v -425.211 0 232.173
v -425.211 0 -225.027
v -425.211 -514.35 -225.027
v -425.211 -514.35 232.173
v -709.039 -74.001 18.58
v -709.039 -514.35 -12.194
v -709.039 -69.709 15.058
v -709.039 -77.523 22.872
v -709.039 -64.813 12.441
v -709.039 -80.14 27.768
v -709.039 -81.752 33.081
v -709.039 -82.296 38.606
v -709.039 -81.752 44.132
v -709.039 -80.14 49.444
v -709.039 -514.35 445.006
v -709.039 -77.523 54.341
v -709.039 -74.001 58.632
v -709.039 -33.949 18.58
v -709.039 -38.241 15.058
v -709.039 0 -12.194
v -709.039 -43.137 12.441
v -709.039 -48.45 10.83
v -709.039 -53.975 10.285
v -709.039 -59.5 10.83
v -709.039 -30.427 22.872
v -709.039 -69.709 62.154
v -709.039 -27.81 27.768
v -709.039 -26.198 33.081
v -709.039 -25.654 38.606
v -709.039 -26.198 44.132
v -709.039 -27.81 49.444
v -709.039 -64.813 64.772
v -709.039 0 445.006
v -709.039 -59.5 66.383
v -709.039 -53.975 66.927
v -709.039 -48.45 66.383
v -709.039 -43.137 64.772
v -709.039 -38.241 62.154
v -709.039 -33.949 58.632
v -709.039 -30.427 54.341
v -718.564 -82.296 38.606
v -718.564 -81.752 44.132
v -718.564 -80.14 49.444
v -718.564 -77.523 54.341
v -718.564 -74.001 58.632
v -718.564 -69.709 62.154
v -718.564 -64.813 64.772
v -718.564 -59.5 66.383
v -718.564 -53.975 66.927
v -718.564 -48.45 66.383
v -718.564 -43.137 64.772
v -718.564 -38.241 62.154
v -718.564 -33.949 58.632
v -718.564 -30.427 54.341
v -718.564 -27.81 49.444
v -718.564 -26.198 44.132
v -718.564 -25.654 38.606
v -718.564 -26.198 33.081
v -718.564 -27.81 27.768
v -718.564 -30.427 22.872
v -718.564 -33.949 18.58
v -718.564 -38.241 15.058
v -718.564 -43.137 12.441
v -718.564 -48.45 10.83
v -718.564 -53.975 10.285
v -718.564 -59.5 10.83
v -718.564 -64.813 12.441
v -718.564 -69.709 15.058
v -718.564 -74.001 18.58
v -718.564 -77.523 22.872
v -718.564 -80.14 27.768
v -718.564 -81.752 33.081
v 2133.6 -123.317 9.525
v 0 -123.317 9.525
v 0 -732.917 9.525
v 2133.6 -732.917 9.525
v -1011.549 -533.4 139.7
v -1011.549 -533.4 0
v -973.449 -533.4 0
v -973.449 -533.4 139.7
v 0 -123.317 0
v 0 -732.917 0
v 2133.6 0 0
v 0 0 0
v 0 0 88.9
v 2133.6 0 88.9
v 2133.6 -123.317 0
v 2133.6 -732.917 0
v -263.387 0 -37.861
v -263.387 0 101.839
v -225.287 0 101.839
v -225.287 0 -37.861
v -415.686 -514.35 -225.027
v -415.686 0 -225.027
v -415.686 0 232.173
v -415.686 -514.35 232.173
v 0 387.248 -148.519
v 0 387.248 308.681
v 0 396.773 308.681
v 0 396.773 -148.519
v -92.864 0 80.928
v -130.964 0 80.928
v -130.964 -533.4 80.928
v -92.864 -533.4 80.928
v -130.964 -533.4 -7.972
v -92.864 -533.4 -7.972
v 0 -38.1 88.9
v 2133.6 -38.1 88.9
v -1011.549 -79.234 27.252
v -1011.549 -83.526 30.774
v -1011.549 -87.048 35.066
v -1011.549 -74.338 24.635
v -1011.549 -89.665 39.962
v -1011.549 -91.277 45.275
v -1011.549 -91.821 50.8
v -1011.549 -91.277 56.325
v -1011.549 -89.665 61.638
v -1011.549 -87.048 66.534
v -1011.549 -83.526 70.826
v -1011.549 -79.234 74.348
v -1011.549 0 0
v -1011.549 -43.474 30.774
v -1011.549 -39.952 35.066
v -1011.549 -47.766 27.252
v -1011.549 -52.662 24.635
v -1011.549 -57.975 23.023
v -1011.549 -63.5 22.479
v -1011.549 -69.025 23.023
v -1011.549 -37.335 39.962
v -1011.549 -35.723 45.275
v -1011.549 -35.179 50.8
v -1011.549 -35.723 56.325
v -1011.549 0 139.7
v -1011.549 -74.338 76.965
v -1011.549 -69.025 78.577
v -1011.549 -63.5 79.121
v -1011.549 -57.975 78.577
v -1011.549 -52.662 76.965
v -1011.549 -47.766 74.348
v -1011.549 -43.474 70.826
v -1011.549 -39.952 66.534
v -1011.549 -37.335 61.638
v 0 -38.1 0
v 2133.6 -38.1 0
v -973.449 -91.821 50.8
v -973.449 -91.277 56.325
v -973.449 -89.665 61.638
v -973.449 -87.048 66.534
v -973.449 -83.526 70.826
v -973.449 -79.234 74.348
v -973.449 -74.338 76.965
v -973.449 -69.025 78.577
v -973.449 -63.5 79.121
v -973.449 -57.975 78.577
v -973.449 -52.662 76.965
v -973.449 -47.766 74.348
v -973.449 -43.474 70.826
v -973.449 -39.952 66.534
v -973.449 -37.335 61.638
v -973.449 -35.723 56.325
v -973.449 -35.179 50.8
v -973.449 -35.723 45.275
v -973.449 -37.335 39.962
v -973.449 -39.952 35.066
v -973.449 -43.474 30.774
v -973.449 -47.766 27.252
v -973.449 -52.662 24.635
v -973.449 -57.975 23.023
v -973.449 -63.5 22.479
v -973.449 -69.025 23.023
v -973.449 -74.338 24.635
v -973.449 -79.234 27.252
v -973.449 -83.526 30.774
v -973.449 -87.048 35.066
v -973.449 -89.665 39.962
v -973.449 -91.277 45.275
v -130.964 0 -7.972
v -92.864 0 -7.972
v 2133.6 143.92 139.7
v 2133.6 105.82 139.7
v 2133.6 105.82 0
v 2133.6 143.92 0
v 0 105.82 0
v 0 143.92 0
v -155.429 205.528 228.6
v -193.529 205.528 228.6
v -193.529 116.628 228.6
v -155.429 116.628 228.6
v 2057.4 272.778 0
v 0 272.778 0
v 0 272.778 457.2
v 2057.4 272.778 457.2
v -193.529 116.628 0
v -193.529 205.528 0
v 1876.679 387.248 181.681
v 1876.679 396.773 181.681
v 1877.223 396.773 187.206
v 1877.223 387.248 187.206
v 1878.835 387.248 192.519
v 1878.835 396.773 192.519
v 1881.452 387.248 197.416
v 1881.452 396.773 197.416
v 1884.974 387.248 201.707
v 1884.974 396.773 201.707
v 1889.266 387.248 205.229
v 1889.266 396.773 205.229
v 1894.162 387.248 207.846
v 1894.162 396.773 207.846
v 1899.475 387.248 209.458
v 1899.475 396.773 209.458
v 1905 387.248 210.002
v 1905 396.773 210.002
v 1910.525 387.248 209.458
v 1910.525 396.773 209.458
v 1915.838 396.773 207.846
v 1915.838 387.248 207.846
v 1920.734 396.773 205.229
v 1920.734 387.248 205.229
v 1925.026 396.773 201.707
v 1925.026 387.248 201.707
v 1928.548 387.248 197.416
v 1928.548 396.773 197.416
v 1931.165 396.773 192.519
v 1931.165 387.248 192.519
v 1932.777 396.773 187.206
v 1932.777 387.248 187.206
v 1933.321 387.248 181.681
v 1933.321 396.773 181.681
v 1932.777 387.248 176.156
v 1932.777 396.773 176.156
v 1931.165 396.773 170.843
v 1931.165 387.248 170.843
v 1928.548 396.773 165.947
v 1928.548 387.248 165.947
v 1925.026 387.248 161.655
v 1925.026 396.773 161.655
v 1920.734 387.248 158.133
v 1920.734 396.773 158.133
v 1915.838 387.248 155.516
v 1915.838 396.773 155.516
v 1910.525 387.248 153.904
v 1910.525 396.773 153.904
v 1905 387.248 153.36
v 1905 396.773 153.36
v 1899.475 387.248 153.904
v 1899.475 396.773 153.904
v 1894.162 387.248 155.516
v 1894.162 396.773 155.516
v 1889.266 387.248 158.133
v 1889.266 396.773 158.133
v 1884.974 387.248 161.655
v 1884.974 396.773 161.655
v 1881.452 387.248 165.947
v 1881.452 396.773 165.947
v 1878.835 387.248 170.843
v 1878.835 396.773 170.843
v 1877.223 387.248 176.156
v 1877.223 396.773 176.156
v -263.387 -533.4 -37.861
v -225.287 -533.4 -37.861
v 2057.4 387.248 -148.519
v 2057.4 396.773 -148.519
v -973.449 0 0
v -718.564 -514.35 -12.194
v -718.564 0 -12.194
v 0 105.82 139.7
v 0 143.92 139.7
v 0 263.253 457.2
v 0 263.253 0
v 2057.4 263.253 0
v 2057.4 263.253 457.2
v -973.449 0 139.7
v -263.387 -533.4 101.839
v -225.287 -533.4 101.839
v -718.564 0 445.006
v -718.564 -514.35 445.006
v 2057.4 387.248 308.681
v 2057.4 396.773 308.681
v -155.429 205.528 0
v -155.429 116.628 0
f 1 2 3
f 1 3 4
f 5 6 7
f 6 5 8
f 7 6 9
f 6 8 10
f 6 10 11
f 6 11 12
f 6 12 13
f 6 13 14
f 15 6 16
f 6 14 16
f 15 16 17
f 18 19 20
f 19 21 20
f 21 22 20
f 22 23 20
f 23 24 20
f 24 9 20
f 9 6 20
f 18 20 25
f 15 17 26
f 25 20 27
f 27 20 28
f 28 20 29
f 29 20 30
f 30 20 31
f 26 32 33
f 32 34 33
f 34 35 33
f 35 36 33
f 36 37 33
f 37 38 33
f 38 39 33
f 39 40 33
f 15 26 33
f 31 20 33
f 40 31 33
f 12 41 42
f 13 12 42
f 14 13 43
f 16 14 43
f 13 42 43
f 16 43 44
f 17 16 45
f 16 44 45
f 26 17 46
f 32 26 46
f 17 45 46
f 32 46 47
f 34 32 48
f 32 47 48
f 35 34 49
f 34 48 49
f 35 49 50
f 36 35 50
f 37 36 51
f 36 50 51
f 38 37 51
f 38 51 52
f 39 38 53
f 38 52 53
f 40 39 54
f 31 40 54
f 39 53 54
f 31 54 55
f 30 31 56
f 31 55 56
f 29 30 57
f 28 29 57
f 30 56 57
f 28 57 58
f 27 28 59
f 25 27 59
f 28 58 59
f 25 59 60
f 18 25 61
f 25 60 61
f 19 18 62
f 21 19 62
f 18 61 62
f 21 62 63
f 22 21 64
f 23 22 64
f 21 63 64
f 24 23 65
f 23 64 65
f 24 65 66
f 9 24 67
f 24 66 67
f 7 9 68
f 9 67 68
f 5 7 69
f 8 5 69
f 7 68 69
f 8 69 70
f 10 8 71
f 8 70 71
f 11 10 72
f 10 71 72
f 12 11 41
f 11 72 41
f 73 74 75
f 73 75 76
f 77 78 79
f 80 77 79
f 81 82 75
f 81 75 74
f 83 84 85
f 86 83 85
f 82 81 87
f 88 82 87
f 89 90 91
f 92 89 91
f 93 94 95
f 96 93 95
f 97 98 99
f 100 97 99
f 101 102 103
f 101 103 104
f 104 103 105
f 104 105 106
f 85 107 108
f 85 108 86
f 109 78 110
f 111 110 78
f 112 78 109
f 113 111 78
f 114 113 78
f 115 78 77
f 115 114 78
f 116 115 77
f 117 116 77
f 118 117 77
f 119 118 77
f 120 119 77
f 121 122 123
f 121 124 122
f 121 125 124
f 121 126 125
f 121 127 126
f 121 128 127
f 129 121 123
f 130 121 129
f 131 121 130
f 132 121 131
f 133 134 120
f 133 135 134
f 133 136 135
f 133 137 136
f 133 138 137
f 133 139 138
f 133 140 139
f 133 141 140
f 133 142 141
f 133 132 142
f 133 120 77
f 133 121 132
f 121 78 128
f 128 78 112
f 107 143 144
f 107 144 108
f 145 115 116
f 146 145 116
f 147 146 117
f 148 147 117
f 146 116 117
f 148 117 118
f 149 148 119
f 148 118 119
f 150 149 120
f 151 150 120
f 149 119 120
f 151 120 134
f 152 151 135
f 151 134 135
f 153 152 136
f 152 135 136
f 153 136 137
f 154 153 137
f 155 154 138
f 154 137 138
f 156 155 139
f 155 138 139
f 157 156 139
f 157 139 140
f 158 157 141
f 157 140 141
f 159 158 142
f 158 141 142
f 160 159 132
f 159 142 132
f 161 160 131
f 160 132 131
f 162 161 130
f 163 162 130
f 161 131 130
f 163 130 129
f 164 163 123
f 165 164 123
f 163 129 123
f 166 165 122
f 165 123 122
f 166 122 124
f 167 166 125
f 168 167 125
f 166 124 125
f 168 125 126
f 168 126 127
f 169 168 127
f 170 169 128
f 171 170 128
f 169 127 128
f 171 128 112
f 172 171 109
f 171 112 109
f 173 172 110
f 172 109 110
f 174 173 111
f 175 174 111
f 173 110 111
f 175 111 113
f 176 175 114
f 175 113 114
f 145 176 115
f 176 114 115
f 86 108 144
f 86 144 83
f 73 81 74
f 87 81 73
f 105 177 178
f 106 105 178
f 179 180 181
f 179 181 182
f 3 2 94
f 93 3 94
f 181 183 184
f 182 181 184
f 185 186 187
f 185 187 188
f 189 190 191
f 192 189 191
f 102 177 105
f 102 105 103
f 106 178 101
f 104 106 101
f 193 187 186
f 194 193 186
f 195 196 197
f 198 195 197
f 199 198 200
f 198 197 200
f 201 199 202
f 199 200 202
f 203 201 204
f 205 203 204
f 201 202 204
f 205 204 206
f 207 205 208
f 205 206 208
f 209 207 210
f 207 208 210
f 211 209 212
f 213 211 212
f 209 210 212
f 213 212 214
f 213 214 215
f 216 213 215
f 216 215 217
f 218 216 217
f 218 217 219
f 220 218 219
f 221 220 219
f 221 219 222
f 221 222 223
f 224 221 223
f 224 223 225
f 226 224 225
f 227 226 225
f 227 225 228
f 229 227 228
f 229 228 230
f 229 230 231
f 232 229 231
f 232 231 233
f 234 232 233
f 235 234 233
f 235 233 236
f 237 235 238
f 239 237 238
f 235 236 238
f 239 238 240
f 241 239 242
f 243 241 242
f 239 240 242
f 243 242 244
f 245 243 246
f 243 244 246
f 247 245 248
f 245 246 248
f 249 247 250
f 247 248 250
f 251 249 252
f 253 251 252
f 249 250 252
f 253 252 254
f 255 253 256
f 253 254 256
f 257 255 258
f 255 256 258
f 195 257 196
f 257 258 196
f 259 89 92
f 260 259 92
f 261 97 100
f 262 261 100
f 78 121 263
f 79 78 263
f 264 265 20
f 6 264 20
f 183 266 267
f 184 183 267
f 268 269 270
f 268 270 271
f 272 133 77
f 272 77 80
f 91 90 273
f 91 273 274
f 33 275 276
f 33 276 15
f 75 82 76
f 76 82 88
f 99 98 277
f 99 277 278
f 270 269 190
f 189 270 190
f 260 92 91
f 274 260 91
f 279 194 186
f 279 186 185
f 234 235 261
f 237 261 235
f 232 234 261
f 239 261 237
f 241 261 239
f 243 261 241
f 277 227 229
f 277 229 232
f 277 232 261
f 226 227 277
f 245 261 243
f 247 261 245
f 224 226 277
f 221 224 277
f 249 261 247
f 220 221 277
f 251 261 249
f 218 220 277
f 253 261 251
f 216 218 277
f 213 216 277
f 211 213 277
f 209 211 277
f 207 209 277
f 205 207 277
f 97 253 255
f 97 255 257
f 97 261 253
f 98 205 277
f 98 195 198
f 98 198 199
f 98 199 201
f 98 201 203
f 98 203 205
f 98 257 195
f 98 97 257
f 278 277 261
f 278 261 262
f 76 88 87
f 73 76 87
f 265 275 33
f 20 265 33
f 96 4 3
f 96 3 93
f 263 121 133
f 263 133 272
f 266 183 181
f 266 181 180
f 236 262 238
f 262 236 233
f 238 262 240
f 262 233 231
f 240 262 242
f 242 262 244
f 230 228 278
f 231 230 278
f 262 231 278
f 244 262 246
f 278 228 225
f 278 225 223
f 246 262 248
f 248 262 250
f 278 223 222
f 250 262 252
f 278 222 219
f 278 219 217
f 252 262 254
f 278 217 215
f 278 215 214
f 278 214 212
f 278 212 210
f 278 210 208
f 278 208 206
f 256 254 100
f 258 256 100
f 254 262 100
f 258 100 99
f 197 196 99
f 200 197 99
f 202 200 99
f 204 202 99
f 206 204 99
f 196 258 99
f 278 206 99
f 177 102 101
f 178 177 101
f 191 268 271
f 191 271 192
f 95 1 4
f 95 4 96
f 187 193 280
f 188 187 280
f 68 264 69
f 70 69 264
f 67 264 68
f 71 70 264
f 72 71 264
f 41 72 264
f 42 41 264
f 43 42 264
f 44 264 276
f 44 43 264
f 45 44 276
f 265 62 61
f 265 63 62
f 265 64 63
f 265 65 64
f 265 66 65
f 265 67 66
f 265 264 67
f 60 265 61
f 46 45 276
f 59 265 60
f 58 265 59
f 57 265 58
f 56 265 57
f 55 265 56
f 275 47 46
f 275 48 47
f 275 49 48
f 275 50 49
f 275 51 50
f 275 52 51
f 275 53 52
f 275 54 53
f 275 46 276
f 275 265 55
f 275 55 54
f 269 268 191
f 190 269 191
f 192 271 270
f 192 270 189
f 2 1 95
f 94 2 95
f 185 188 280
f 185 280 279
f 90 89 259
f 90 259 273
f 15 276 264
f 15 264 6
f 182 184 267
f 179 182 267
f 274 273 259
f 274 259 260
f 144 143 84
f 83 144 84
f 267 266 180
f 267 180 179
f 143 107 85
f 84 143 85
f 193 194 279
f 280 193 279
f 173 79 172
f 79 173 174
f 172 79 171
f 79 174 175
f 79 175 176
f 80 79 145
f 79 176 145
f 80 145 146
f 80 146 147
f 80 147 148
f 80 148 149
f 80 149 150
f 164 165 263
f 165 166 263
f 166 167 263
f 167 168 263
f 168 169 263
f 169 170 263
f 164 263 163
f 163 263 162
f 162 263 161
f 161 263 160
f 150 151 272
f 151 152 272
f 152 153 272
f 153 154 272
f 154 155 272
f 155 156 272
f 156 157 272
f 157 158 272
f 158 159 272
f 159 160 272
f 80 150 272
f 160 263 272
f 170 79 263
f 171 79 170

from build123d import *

# Parameters (mm, degrees)
F0_W      = 38.1
F0_H      = 88.9
F1_DEPTH  = 2133.6
F2_W      = 38.1
F2_H      = 88.9
F3_DEPTH  = 533.4
F4_W      = 38.1
F4_H      = 139.7
F5_DEPTH  = 2133.6
F6_W      = 38.1
F6_H      = 139.7
F7_DEPTH  = 533.4
F8_W      = 38.1
F8_H      = 88.9
F9_DEPTH  = 228.6
F10_W     = 2133.6
F10_H     = 609.6
F11_DEPTH = 9.525
F12_W     = 9.525
F12_H     = 457.2
F13_DEPTH = 2057.4
F14_W     = 9.525
F14_H     = 457.2
F15_DEPTH = 2057.4
F16_W     = 9.525
F16_H     = 457.2
F17_DEPTH = 514.35
F18_W     = 9.525
F18_H     = 457.2
F19_DEPTH = 514.35
F20_W     = 38.1
F20_H     = 139.7
F21_DEPTH = 533.4
F22_R     = 28.321
F23_DEPTH = 38.1
F24_R     = 28.321
F25_DEPTH = 9.525
F26_R     = 28.321
F27_DEPTH = 25.4


with BuildPart() as f1:
    # F0 (on Right) → F1 (new body)
    with BuildSketch(Plane.YZ):
        with Locations((-19.05, 44.45)):
            Rectangle(F0_W, F0_H)
    extrude(amount=F1_DEPTH)


with BuildPart() as f3:
    # F2 (on Front) → F3 (new body)
    with BuildSketch(Plane.XZ):
        with Locations((-111.913837, 36.477584)):
            Rectangle(F2_W, F2_H)
    extrude(amount=F3_DEPTH)


with BuildPart() as f5:
    # F4 (on Right) → F5 (new body)
    with BuildSketch(Plane.YZ):
        with Locations((124.870102, 69.85)):
            Rectangle(F4_W, F4_H)
    extrude(amount=F5_DEPTH)


with BuildPart() as f7:
    # F6 (on Front) → F7 (new body)
    with BuildSketch(Plane.XZ):
        with Locations((-244.33665, 31.989101)):
            Rectangle(F6_W, F6_H)
    extrude(amount=F7_DEPTH)


with BuildPart() as f9:
    # F8 (on Top) → F9 (new body)
    with BuildSketch(Plane.XY):
        with Locations((-174.478993, 161.077559)):
            Rectangle(F8_W, F8_H)
    extrude(amount=F9_DEPTH)


with BuildPart() as f11:
    # F10 (on Top) → F11 (new body)
    with BuildSketch(Plane.XY):
        with Locations((1066.8, -428.116654)):
            Rectangle(F10_W, F10_H)
    extrude(amount=F11_DEPTH)


with BuildPart() as f13:
    # F12 (on Right) → F13 (new body)
    with BuildSketch(Plane.YZ):
        with Locations((268.015032, 228.6)):
            Rectangle(F12_W, F12_H)
    extrude(amount=F13_DEPTH)


with BuildPart() as f15:
    # F14 (on Right) → F15 (new body)
    with BuildSketch(Plane.YZ):
        with Locations((392.010808, 80.081202)):
            Rectangle(F14_W, F14_H)
    extrude(amount=F15_DEPTH)

    # F26 (on face) → F27 (cut)
    with BuildSketch(Plane(origin=(0, 396.773308, 0), x_dir=(-1, 0, 0), z_dir=(0, 1, 0))):
        with Locations((-1905, 181.681202)):
            Circle(F26_R)
    extrude(amount=-F27_DEPTH, mode=Mode.SUBTRACT)


with BuildPart() as f17:
    # F16 (on Front) → F17 (new body)
    with BuildSketch(Plane.XZ):
        with Locations((-420.448571, 3.57252)):
            Rectangle(F16_W, F16_H)
    extrude(amount=F17_DEPTH)


with BuildPart() as f19:
    # F18 (on Front) → F19 (new body)
    with BuildSketch(Plane.XZ):
        with Locations((-713.801622, 216.40639)):
            Rectangle(F18_W, F18_H)
    extrude(amount=F19_DEPTH)

    # F24 (on face) → F25 (cut)
    with BuildSketch(Plane(origin=(-718.564122, 0, 0), x_dir=(0, -1, 0), z_dir=(-1, 0, 0))):
        with Locations((53.975, 38.60639)):
            Circle(F24_R)
    extrude(amount=-F25_DEPTH, mode=Mode.SUBTRACT)


with BuildPart() as f21:
    # F20 (on Front) → F21 (new body)
    with BuildSketch(Plane.XZ):
        with Locations((-992.498633, 69.85)):
            Rectangle(F20_W, F20_H)
    extrude(amount=F21_DEPTH)

    # F22 (on face) → F23 (cut)
    with BuildSketch(Plane(origin=(-1011.548633, 0, 0), x_dir=(0, -1, 0), z_dir=(-1, 0, 0))):
        with Locations((63.5, 50.8)):
            Circle(F22_R)
    extrude(amount=-F23_DEPTH, mode=Mode.SUBTRACT)


solid = Compound([f1.part, f3.part, f5.part, f7.part, f9.part, f11.part, f13.part, f15.part, f17.part, f19.part, f21.part])
